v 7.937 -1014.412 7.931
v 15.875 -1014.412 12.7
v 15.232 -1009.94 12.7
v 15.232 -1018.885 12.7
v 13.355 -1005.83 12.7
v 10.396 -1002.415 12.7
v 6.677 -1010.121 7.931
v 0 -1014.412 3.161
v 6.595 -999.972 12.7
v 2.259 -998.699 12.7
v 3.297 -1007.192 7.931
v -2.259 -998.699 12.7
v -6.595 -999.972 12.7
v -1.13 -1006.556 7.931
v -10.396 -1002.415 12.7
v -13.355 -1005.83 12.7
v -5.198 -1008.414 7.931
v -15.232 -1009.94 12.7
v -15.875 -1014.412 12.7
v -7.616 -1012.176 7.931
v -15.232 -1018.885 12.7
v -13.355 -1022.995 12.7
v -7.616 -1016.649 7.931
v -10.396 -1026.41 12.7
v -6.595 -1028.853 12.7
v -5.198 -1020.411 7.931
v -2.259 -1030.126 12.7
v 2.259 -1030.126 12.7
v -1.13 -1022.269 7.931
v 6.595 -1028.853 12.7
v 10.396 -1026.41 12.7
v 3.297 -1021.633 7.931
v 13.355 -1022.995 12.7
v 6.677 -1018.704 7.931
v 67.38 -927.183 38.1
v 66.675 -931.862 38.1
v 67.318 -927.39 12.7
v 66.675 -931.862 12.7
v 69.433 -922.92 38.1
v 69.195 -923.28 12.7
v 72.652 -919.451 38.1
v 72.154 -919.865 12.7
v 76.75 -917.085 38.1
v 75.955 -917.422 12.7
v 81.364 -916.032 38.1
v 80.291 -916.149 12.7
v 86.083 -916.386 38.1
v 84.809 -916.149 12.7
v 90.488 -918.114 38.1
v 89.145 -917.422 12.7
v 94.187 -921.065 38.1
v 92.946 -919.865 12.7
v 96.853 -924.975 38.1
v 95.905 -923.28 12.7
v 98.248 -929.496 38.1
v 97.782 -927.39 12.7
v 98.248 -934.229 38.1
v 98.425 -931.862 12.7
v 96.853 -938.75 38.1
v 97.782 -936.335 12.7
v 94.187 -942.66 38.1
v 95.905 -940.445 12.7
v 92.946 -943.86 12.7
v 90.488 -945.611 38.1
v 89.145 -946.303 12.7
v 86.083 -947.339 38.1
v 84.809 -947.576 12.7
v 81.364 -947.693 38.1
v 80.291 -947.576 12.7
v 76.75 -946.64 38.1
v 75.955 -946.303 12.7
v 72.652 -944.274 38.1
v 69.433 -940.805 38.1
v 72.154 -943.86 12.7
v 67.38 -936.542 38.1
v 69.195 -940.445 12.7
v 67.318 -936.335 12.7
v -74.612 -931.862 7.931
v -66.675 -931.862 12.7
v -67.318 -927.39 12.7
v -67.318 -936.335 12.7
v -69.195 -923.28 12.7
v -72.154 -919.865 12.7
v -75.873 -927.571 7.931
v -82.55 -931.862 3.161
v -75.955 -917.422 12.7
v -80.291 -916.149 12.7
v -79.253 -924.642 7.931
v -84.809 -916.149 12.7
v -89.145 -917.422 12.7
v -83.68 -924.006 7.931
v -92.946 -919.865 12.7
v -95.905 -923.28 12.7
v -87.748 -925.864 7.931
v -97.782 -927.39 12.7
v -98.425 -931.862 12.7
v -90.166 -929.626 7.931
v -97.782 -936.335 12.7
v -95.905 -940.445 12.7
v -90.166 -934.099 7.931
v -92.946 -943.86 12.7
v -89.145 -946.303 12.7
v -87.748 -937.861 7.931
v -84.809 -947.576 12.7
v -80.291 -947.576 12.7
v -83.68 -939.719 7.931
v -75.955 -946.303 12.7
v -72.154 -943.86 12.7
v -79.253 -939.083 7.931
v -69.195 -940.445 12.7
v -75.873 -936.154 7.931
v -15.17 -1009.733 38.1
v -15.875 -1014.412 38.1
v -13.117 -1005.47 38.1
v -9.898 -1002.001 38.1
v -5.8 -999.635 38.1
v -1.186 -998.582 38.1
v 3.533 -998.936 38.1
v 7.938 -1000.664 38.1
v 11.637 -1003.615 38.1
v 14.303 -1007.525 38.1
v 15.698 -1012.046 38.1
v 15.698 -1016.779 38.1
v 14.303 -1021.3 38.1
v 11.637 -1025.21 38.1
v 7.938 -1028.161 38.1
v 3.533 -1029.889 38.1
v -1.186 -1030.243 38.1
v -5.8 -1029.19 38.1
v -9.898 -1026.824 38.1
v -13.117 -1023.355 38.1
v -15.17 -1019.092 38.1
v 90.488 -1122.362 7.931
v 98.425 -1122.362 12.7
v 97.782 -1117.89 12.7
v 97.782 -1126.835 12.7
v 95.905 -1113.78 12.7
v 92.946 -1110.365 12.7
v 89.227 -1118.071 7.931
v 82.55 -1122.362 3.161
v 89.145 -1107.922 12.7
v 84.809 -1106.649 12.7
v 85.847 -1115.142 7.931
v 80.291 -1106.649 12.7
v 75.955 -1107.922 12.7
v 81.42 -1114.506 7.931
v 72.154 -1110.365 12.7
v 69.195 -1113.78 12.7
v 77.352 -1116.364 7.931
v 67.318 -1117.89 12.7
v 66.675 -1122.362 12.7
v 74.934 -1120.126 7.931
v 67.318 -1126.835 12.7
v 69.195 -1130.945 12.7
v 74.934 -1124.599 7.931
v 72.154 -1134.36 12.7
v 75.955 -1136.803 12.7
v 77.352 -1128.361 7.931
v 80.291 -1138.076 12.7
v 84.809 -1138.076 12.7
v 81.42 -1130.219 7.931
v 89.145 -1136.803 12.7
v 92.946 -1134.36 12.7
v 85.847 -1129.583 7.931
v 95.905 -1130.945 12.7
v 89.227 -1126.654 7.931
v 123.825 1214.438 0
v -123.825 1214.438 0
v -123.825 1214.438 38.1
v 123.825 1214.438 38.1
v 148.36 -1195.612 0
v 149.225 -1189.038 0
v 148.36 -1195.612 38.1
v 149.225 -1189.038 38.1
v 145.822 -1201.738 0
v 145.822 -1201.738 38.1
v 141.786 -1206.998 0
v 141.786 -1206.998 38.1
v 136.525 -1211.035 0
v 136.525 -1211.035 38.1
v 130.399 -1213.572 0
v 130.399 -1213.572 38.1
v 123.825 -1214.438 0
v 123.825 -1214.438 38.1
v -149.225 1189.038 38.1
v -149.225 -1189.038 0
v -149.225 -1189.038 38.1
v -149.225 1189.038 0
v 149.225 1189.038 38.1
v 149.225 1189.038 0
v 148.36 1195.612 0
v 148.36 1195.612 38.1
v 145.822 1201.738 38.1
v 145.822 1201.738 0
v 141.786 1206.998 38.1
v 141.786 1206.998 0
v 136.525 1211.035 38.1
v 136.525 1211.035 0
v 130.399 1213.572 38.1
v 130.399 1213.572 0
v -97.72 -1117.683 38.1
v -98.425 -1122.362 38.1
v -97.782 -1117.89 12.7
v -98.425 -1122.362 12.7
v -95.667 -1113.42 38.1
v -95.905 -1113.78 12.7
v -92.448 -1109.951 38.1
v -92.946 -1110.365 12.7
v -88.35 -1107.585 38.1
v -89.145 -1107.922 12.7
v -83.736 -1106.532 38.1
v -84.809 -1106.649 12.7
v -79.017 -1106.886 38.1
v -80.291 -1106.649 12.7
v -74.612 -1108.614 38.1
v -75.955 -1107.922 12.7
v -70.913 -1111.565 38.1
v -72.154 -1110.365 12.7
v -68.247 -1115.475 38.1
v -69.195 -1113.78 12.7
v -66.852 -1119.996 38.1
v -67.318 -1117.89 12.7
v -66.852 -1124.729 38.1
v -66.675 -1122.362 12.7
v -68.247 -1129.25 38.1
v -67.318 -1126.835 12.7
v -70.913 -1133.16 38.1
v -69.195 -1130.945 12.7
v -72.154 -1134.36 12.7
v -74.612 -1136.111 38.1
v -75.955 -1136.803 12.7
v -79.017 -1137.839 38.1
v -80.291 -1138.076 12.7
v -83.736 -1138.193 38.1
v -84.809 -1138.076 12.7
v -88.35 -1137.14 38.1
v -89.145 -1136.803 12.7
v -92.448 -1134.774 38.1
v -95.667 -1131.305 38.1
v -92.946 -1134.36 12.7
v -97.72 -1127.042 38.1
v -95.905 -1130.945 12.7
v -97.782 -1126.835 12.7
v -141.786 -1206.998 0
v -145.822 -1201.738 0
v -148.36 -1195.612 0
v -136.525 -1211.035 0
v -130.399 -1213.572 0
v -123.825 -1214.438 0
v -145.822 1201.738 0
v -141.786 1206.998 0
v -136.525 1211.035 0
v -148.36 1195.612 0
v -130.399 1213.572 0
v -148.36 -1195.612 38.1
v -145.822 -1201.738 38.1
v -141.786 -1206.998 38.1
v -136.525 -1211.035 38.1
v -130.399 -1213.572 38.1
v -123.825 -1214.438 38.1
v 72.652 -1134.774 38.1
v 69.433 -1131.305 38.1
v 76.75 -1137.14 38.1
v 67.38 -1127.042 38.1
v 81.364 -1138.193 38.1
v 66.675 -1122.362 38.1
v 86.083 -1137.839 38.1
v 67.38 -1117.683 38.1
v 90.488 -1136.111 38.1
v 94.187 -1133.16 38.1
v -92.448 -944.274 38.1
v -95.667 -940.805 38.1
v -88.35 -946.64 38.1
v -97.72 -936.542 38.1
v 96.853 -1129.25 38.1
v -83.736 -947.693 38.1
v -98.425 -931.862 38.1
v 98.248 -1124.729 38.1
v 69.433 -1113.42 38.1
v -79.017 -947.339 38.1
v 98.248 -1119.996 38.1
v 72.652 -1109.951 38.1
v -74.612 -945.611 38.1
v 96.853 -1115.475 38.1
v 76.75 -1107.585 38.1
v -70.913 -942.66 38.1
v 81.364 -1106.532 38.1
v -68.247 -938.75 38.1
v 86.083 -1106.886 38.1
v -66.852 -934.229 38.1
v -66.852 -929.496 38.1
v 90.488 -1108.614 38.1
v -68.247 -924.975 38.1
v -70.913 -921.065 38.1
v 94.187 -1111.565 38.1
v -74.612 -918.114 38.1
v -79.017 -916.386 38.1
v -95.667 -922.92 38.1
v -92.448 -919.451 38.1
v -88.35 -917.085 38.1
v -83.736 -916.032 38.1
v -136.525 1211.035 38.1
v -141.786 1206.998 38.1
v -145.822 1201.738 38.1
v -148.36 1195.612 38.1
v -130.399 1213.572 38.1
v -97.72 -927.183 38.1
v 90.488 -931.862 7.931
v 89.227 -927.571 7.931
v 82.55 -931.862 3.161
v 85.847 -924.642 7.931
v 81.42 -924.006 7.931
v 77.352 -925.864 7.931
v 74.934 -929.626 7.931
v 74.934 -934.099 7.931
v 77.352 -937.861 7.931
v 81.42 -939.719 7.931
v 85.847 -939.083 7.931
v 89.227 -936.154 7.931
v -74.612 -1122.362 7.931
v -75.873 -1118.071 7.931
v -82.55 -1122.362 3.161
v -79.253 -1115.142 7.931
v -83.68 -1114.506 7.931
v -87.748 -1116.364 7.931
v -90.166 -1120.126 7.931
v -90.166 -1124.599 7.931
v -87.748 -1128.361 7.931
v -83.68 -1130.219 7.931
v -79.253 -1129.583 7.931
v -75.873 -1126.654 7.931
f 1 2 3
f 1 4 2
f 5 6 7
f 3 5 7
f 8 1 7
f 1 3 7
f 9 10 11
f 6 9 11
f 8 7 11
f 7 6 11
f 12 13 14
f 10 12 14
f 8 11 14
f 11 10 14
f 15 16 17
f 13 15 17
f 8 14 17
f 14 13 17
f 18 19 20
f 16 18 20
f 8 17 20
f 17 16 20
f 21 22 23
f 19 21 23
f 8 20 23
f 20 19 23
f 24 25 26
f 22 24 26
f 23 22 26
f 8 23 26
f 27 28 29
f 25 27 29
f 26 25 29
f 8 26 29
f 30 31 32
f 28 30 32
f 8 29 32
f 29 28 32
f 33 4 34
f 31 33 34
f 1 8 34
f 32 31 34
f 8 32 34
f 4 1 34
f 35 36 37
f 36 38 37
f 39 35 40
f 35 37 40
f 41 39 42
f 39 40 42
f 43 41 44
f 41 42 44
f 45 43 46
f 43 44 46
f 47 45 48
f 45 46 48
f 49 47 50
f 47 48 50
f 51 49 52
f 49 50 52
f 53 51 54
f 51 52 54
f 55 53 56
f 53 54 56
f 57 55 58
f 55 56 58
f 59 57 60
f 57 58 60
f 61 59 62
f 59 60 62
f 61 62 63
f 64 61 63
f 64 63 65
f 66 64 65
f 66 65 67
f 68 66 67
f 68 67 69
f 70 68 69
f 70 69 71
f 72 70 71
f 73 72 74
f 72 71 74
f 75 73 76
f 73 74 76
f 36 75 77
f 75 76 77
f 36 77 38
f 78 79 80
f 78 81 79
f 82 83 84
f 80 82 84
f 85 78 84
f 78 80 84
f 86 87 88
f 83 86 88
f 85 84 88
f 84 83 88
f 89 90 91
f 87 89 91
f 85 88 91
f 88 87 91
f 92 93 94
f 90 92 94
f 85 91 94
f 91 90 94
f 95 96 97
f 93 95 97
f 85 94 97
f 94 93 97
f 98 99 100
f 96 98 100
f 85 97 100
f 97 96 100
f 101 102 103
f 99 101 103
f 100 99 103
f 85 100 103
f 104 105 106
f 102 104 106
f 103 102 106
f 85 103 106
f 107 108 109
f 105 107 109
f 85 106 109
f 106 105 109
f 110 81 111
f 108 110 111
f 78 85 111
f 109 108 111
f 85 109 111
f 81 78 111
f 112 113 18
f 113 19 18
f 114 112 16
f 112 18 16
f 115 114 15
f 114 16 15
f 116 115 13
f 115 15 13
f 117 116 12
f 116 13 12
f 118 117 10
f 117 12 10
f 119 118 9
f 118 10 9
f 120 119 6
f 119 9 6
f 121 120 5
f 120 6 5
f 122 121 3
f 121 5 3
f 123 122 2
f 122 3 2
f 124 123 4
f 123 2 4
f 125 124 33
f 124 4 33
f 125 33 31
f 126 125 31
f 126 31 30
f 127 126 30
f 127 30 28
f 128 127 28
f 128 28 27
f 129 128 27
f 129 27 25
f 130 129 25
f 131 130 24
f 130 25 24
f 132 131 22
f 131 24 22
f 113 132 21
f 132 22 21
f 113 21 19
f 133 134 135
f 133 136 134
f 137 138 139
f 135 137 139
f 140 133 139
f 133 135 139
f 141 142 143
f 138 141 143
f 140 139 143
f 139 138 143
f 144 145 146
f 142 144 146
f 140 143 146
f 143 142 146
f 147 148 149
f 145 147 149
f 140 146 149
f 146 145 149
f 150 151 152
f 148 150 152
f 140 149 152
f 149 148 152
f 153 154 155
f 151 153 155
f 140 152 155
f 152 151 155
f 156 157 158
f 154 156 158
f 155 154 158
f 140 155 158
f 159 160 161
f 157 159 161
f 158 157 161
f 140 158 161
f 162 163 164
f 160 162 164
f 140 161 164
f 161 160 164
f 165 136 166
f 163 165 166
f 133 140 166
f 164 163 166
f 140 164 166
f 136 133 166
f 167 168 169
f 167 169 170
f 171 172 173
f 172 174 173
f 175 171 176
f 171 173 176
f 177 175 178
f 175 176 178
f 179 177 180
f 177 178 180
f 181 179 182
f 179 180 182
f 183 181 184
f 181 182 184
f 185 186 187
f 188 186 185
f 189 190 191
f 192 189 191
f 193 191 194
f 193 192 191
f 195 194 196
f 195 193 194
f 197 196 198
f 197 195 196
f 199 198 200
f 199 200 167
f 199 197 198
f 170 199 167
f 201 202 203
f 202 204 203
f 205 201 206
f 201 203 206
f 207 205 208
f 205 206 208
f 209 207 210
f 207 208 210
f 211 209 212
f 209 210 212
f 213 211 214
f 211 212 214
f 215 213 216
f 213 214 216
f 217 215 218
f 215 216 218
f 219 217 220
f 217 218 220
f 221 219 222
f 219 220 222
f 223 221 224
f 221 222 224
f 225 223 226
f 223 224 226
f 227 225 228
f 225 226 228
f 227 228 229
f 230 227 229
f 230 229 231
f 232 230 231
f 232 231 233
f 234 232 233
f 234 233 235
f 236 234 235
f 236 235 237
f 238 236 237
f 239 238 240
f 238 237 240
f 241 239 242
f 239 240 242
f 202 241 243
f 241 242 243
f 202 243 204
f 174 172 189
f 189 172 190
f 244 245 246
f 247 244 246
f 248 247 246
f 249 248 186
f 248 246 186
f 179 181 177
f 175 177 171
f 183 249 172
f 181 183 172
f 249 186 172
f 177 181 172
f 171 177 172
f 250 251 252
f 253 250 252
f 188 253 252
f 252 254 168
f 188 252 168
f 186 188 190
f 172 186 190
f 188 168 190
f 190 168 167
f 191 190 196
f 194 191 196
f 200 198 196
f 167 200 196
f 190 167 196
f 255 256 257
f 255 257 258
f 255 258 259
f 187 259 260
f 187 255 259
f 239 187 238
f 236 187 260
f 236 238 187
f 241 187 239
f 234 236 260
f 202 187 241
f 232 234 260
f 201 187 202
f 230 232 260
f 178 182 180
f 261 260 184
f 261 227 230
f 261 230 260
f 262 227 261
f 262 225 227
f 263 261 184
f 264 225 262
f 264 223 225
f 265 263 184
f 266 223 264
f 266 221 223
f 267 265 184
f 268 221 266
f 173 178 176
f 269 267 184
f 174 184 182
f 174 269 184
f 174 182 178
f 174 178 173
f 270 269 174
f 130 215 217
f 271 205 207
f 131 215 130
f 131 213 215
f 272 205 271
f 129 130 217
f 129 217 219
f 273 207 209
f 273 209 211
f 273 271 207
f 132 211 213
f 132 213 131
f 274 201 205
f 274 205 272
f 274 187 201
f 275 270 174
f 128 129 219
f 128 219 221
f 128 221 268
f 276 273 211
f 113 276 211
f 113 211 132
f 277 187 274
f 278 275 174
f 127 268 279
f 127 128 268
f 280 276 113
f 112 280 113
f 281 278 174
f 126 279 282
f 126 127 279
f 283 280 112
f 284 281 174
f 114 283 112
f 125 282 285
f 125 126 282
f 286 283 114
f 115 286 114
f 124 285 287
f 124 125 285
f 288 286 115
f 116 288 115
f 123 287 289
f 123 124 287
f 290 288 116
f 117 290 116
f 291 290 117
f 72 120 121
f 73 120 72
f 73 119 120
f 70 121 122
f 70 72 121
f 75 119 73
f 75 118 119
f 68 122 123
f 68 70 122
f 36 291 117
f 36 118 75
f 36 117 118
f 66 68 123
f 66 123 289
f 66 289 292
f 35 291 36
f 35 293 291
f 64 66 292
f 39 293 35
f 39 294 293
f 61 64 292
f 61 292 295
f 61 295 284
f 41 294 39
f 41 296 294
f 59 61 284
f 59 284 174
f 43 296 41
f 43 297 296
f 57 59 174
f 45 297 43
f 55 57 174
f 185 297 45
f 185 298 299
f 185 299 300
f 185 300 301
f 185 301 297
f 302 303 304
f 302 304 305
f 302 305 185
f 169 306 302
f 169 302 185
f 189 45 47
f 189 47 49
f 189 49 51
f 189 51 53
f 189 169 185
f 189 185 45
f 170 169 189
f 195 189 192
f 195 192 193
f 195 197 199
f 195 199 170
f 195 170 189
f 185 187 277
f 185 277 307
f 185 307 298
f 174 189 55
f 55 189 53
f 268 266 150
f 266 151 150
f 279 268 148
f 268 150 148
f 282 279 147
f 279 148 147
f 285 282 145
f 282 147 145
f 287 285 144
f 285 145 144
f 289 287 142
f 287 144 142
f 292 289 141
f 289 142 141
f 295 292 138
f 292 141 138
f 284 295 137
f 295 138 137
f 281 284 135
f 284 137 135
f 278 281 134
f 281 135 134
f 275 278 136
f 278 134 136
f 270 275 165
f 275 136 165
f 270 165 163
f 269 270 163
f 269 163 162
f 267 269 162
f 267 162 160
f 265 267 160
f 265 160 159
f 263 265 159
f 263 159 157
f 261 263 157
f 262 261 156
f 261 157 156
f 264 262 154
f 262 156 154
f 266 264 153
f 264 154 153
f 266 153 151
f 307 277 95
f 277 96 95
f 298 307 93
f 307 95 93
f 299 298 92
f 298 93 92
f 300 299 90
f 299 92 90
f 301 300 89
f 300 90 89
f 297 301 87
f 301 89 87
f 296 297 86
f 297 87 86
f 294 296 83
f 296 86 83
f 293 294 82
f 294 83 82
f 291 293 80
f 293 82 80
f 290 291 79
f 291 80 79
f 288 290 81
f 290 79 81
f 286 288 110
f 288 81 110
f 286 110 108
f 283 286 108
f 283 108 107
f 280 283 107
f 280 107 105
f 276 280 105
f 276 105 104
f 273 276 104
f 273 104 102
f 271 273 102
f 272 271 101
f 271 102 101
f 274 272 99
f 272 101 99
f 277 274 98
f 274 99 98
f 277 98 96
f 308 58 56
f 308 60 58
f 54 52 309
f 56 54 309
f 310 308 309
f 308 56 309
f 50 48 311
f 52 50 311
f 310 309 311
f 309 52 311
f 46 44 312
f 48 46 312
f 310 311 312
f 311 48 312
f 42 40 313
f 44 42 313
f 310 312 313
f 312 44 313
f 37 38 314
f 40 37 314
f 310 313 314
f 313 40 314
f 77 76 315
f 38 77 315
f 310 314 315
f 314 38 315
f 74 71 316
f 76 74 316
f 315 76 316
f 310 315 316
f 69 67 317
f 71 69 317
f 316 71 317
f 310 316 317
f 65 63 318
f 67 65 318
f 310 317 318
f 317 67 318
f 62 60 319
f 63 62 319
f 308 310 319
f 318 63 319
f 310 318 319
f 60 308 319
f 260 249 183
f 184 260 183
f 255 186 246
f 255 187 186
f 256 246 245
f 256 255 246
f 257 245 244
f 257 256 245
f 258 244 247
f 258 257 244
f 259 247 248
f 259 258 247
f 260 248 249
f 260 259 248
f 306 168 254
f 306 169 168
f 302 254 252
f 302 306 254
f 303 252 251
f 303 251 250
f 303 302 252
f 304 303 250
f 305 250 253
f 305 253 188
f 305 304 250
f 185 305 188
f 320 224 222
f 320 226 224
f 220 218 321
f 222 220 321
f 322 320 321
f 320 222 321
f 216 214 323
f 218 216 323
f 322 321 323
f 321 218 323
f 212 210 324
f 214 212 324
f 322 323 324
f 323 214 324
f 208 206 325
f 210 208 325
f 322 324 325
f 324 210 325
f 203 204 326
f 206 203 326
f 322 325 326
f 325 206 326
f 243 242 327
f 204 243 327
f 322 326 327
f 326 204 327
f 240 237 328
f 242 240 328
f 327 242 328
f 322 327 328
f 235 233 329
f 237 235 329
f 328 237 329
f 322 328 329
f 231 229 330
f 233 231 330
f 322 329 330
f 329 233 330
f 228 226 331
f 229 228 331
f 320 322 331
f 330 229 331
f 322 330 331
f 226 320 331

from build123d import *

# Parameters (mm, degrees)
F0_W     = 298.45
F0_H     = 2428.875
F1_DEPTH = 38.1
F2_R     = 25.4
F3_R     = 25.4
F4_R     = 25.4
F6_D     = 31.75
F6_DEPTH = 25.4
F6_TIP   = 9.5386623271


with BuildPart() as f1:
    # F0 (on Top) → F1 (new body)
    with BuildSketch(Plane.XY):
        Rectangle(F0_W, F0_H)
    extrude(amount=F1_DEPTH)

    # F2
    f2_edges = [f1.edges().sort_by_distance(p)[0] for p in [
        (149.225, 1214.4375, 19.05),
    ]]
    fillet(f2_edges, radius=F2_R)

    # F3
    f3_edges = [f1.edges().sort_by_distance(p)[0] for p in [
        (-149.225, 1214.4375, 19.05),
    ]]
    fillet(f3_edges, radius=F3_R)

    # F4
    f4_edges = [f1.edges().sort_by_distance(p)[0] for p in [
        (-149.225, -1214.4375, 19.05),
        (149.225, -1214.4375, 19.05),
    ]]
    fillet(f4_edges, radius=F4_R)

    # F6
    with Locations(Plane.XY.offset(38.1)):
        with Locations((-82.55, -1122.3625), (82.55, -1122.3625), (0, -1014.4125), (82.55, -931.8625), (-82.55, -931.8625)):
            Hole(F6_D / 2, depth=F6_DEPTH)
            with Locations((0, 0, -(F6_DEPTH + F6_TIP / 2))):  # 118° drill point
                Cone(0, F6_D / 2, F6_TIP, mode=Mode.SUBTRACT)


solid = f1.part
